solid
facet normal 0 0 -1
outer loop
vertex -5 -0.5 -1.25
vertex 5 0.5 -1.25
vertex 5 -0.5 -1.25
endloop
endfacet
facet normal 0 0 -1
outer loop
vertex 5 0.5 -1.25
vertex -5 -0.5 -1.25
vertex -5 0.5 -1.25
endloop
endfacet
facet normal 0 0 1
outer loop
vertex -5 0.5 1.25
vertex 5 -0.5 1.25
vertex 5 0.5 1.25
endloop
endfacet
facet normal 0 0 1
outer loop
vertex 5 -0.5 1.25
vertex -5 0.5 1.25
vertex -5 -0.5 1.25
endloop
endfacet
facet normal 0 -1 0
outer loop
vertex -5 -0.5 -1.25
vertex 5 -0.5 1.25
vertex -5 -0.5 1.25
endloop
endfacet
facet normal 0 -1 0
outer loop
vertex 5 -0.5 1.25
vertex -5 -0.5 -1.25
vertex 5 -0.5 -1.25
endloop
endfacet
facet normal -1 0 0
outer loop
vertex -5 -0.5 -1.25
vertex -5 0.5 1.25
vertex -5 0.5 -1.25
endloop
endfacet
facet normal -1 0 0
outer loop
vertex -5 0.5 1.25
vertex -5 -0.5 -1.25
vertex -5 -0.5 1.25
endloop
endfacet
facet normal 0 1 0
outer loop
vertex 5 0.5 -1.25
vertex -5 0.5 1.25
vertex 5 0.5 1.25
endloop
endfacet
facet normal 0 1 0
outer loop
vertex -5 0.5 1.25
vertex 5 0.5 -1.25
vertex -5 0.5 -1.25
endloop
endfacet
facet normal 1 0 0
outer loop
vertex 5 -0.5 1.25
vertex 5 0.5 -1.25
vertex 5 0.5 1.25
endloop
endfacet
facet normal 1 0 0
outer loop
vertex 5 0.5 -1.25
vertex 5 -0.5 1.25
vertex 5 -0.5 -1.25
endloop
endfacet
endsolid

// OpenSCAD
rotate(a=[180.0, 0.0, 180.0]) {
    cube(size=[10.0, 1.0, 2.5], center=true);
};
